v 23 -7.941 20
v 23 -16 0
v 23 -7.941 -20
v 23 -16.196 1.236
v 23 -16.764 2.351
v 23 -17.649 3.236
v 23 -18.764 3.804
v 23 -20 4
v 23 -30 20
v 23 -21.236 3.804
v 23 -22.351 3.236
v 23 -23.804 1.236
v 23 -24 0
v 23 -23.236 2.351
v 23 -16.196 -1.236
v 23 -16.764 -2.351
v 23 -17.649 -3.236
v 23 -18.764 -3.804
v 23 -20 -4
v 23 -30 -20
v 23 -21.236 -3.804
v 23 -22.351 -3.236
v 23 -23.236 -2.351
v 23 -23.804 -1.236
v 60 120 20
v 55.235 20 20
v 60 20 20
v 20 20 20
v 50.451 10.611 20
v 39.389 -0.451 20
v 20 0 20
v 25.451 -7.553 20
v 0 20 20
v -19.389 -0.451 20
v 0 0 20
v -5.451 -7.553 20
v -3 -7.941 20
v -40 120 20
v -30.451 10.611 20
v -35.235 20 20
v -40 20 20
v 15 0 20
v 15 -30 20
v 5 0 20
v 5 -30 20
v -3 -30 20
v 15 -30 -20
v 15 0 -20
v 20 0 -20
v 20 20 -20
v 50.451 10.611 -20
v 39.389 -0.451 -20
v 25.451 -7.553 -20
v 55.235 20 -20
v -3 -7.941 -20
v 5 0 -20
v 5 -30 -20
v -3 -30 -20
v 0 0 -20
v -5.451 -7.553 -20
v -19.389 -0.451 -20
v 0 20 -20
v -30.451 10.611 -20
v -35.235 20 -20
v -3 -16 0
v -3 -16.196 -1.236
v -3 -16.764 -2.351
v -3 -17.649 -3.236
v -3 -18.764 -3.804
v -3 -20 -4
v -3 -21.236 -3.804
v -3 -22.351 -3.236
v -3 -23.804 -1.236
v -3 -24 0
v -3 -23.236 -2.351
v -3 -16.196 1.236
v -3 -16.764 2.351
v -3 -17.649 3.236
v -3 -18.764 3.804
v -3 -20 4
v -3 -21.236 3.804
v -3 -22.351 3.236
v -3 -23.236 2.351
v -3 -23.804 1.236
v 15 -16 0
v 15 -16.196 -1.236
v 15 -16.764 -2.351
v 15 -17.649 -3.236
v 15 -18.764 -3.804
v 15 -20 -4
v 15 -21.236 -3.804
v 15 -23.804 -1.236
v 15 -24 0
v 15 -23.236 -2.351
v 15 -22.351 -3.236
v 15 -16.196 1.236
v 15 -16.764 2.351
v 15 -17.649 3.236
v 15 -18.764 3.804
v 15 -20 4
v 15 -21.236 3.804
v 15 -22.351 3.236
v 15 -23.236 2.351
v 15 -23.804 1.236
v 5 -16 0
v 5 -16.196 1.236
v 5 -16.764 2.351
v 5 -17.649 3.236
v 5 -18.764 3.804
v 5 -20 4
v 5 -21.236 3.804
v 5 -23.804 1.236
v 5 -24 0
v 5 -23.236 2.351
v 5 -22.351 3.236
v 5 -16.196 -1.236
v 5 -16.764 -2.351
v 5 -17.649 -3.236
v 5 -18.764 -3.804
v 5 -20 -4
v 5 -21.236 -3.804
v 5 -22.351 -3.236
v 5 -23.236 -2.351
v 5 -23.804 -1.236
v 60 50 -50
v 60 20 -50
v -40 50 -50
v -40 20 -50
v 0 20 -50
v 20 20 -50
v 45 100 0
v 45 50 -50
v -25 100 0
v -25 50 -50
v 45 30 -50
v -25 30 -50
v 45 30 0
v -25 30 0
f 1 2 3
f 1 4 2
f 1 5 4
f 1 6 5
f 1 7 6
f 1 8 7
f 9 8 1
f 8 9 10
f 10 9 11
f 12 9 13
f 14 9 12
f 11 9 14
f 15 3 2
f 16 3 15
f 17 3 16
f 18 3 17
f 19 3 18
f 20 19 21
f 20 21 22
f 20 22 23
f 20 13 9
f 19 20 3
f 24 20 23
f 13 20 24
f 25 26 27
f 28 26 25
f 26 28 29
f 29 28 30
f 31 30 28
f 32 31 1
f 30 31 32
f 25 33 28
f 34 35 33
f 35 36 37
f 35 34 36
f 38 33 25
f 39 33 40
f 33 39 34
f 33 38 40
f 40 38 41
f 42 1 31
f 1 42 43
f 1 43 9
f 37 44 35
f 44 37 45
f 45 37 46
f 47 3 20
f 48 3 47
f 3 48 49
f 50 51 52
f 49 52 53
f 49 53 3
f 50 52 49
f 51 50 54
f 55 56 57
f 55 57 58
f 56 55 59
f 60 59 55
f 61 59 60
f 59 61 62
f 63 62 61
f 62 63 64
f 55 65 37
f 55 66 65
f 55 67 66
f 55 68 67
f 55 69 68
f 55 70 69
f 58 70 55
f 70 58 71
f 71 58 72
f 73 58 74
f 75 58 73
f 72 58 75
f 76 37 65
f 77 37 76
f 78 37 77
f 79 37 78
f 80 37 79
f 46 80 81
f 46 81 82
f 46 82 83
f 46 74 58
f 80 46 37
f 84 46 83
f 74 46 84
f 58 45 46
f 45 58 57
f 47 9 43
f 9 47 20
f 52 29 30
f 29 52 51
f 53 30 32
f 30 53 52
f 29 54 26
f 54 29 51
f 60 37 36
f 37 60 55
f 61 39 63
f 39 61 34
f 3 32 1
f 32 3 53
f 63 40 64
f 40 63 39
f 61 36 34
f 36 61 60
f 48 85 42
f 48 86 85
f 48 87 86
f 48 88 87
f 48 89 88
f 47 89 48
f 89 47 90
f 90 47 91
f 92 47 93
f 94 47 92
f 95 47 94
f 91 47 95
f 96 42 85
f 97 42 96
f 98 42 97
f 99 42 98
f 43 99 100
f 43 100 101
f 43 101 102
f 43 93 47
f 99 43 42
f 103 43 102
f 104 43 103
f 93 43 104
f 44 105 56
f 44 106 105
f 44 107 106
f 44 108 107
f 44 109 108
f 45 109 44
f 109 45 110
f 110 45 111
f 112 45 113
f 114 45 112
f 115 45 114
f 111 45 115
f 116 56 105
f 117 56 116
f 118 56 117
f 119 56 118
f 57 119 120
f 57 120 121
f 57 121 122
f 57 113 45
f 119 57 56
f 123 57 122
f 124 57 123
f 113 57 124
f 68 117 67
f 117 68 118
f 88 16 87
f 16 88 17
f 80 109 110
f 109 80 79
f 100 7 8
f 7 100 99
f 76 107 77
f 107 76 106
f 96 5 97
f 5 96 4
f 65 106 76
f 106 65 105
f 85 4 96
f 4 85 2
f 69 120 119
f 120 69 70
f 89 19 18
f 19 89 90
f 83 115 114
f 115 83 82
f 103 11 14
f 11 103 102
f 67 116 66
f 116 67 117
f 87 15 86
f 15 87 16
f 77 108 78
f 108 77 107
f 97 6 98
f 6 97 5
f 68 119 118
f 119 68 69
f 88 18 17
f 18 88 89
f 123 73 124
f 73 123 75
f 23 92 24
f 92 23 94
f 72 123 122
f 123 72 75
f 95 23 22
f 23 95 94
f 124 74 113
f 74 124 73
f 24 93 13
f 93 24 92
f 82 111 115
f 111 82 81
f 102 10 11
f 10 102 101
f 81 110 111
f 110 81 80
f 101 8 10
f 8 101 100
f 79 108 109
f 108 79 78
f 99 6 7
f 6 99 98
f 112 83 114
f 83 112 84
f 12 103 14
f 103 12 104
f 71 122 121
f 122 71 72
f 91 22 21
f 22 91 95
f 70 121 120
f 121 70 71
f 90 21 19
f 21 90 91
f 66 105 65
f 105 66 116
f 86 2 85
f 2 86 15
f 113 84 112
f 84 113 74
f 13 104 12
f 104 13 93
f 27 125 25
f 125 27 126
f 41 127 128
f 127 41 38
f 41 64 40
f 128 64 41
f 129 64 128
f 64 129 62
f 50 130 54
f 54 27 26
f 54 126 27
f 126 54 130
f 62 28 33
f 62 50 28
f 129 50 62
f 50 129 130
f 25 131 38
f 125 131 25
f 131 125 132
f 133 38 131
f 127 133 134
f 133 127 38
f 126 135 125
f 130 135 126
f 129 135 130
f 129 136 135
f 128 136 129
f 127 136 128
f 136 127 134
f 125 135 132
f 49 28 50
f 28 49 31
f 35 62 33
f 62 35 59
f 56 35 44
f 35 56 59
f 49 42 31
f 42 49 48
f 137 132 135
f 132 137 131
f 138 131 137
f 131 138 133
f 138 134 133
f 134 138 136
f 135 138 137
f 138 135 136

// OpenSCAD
difference() {
    
   union() {
        difference() {
            
            // presilha 
            union() {
                // aletas da presilha
                translate([-3,-30,-20])
                cube ([26, 55, 40]);
                
                // reforco cilindrico ao redor da presilha
                translate([10,40,-20])
                cylinder(r1=50, r2=50, h=40, $fn=20);
            }

            // espaco entre as abas da presilha
            translate([5,-35, -50])
            cube ([10, 40, 100]);
            
            // burao parafuso
            translate([-10, -20, -0])
            rotate([0, 90, 0])
            cylinder(r1=4, r2=4, h=50, $fn=20);
        }

        difference() {
            translate([-40, 20, -100])
            cube ([100, 100, 120]);

            translate([-50,-30,-130])
            rotate([-45, 0, 0])
            cube ([120, 200, 220]);
            
            translate([-50, 10, -170])
            cube ([120, 100, 120]);
            
            
        }

    }
    
    //tubo
    translate([0,0,-100])
    cube ([20, 20, 200]);
    
    // vao na parte de baixo do suporte
    translate([-25, 30, -120])
    cube ([70, 100, 120]);
}
